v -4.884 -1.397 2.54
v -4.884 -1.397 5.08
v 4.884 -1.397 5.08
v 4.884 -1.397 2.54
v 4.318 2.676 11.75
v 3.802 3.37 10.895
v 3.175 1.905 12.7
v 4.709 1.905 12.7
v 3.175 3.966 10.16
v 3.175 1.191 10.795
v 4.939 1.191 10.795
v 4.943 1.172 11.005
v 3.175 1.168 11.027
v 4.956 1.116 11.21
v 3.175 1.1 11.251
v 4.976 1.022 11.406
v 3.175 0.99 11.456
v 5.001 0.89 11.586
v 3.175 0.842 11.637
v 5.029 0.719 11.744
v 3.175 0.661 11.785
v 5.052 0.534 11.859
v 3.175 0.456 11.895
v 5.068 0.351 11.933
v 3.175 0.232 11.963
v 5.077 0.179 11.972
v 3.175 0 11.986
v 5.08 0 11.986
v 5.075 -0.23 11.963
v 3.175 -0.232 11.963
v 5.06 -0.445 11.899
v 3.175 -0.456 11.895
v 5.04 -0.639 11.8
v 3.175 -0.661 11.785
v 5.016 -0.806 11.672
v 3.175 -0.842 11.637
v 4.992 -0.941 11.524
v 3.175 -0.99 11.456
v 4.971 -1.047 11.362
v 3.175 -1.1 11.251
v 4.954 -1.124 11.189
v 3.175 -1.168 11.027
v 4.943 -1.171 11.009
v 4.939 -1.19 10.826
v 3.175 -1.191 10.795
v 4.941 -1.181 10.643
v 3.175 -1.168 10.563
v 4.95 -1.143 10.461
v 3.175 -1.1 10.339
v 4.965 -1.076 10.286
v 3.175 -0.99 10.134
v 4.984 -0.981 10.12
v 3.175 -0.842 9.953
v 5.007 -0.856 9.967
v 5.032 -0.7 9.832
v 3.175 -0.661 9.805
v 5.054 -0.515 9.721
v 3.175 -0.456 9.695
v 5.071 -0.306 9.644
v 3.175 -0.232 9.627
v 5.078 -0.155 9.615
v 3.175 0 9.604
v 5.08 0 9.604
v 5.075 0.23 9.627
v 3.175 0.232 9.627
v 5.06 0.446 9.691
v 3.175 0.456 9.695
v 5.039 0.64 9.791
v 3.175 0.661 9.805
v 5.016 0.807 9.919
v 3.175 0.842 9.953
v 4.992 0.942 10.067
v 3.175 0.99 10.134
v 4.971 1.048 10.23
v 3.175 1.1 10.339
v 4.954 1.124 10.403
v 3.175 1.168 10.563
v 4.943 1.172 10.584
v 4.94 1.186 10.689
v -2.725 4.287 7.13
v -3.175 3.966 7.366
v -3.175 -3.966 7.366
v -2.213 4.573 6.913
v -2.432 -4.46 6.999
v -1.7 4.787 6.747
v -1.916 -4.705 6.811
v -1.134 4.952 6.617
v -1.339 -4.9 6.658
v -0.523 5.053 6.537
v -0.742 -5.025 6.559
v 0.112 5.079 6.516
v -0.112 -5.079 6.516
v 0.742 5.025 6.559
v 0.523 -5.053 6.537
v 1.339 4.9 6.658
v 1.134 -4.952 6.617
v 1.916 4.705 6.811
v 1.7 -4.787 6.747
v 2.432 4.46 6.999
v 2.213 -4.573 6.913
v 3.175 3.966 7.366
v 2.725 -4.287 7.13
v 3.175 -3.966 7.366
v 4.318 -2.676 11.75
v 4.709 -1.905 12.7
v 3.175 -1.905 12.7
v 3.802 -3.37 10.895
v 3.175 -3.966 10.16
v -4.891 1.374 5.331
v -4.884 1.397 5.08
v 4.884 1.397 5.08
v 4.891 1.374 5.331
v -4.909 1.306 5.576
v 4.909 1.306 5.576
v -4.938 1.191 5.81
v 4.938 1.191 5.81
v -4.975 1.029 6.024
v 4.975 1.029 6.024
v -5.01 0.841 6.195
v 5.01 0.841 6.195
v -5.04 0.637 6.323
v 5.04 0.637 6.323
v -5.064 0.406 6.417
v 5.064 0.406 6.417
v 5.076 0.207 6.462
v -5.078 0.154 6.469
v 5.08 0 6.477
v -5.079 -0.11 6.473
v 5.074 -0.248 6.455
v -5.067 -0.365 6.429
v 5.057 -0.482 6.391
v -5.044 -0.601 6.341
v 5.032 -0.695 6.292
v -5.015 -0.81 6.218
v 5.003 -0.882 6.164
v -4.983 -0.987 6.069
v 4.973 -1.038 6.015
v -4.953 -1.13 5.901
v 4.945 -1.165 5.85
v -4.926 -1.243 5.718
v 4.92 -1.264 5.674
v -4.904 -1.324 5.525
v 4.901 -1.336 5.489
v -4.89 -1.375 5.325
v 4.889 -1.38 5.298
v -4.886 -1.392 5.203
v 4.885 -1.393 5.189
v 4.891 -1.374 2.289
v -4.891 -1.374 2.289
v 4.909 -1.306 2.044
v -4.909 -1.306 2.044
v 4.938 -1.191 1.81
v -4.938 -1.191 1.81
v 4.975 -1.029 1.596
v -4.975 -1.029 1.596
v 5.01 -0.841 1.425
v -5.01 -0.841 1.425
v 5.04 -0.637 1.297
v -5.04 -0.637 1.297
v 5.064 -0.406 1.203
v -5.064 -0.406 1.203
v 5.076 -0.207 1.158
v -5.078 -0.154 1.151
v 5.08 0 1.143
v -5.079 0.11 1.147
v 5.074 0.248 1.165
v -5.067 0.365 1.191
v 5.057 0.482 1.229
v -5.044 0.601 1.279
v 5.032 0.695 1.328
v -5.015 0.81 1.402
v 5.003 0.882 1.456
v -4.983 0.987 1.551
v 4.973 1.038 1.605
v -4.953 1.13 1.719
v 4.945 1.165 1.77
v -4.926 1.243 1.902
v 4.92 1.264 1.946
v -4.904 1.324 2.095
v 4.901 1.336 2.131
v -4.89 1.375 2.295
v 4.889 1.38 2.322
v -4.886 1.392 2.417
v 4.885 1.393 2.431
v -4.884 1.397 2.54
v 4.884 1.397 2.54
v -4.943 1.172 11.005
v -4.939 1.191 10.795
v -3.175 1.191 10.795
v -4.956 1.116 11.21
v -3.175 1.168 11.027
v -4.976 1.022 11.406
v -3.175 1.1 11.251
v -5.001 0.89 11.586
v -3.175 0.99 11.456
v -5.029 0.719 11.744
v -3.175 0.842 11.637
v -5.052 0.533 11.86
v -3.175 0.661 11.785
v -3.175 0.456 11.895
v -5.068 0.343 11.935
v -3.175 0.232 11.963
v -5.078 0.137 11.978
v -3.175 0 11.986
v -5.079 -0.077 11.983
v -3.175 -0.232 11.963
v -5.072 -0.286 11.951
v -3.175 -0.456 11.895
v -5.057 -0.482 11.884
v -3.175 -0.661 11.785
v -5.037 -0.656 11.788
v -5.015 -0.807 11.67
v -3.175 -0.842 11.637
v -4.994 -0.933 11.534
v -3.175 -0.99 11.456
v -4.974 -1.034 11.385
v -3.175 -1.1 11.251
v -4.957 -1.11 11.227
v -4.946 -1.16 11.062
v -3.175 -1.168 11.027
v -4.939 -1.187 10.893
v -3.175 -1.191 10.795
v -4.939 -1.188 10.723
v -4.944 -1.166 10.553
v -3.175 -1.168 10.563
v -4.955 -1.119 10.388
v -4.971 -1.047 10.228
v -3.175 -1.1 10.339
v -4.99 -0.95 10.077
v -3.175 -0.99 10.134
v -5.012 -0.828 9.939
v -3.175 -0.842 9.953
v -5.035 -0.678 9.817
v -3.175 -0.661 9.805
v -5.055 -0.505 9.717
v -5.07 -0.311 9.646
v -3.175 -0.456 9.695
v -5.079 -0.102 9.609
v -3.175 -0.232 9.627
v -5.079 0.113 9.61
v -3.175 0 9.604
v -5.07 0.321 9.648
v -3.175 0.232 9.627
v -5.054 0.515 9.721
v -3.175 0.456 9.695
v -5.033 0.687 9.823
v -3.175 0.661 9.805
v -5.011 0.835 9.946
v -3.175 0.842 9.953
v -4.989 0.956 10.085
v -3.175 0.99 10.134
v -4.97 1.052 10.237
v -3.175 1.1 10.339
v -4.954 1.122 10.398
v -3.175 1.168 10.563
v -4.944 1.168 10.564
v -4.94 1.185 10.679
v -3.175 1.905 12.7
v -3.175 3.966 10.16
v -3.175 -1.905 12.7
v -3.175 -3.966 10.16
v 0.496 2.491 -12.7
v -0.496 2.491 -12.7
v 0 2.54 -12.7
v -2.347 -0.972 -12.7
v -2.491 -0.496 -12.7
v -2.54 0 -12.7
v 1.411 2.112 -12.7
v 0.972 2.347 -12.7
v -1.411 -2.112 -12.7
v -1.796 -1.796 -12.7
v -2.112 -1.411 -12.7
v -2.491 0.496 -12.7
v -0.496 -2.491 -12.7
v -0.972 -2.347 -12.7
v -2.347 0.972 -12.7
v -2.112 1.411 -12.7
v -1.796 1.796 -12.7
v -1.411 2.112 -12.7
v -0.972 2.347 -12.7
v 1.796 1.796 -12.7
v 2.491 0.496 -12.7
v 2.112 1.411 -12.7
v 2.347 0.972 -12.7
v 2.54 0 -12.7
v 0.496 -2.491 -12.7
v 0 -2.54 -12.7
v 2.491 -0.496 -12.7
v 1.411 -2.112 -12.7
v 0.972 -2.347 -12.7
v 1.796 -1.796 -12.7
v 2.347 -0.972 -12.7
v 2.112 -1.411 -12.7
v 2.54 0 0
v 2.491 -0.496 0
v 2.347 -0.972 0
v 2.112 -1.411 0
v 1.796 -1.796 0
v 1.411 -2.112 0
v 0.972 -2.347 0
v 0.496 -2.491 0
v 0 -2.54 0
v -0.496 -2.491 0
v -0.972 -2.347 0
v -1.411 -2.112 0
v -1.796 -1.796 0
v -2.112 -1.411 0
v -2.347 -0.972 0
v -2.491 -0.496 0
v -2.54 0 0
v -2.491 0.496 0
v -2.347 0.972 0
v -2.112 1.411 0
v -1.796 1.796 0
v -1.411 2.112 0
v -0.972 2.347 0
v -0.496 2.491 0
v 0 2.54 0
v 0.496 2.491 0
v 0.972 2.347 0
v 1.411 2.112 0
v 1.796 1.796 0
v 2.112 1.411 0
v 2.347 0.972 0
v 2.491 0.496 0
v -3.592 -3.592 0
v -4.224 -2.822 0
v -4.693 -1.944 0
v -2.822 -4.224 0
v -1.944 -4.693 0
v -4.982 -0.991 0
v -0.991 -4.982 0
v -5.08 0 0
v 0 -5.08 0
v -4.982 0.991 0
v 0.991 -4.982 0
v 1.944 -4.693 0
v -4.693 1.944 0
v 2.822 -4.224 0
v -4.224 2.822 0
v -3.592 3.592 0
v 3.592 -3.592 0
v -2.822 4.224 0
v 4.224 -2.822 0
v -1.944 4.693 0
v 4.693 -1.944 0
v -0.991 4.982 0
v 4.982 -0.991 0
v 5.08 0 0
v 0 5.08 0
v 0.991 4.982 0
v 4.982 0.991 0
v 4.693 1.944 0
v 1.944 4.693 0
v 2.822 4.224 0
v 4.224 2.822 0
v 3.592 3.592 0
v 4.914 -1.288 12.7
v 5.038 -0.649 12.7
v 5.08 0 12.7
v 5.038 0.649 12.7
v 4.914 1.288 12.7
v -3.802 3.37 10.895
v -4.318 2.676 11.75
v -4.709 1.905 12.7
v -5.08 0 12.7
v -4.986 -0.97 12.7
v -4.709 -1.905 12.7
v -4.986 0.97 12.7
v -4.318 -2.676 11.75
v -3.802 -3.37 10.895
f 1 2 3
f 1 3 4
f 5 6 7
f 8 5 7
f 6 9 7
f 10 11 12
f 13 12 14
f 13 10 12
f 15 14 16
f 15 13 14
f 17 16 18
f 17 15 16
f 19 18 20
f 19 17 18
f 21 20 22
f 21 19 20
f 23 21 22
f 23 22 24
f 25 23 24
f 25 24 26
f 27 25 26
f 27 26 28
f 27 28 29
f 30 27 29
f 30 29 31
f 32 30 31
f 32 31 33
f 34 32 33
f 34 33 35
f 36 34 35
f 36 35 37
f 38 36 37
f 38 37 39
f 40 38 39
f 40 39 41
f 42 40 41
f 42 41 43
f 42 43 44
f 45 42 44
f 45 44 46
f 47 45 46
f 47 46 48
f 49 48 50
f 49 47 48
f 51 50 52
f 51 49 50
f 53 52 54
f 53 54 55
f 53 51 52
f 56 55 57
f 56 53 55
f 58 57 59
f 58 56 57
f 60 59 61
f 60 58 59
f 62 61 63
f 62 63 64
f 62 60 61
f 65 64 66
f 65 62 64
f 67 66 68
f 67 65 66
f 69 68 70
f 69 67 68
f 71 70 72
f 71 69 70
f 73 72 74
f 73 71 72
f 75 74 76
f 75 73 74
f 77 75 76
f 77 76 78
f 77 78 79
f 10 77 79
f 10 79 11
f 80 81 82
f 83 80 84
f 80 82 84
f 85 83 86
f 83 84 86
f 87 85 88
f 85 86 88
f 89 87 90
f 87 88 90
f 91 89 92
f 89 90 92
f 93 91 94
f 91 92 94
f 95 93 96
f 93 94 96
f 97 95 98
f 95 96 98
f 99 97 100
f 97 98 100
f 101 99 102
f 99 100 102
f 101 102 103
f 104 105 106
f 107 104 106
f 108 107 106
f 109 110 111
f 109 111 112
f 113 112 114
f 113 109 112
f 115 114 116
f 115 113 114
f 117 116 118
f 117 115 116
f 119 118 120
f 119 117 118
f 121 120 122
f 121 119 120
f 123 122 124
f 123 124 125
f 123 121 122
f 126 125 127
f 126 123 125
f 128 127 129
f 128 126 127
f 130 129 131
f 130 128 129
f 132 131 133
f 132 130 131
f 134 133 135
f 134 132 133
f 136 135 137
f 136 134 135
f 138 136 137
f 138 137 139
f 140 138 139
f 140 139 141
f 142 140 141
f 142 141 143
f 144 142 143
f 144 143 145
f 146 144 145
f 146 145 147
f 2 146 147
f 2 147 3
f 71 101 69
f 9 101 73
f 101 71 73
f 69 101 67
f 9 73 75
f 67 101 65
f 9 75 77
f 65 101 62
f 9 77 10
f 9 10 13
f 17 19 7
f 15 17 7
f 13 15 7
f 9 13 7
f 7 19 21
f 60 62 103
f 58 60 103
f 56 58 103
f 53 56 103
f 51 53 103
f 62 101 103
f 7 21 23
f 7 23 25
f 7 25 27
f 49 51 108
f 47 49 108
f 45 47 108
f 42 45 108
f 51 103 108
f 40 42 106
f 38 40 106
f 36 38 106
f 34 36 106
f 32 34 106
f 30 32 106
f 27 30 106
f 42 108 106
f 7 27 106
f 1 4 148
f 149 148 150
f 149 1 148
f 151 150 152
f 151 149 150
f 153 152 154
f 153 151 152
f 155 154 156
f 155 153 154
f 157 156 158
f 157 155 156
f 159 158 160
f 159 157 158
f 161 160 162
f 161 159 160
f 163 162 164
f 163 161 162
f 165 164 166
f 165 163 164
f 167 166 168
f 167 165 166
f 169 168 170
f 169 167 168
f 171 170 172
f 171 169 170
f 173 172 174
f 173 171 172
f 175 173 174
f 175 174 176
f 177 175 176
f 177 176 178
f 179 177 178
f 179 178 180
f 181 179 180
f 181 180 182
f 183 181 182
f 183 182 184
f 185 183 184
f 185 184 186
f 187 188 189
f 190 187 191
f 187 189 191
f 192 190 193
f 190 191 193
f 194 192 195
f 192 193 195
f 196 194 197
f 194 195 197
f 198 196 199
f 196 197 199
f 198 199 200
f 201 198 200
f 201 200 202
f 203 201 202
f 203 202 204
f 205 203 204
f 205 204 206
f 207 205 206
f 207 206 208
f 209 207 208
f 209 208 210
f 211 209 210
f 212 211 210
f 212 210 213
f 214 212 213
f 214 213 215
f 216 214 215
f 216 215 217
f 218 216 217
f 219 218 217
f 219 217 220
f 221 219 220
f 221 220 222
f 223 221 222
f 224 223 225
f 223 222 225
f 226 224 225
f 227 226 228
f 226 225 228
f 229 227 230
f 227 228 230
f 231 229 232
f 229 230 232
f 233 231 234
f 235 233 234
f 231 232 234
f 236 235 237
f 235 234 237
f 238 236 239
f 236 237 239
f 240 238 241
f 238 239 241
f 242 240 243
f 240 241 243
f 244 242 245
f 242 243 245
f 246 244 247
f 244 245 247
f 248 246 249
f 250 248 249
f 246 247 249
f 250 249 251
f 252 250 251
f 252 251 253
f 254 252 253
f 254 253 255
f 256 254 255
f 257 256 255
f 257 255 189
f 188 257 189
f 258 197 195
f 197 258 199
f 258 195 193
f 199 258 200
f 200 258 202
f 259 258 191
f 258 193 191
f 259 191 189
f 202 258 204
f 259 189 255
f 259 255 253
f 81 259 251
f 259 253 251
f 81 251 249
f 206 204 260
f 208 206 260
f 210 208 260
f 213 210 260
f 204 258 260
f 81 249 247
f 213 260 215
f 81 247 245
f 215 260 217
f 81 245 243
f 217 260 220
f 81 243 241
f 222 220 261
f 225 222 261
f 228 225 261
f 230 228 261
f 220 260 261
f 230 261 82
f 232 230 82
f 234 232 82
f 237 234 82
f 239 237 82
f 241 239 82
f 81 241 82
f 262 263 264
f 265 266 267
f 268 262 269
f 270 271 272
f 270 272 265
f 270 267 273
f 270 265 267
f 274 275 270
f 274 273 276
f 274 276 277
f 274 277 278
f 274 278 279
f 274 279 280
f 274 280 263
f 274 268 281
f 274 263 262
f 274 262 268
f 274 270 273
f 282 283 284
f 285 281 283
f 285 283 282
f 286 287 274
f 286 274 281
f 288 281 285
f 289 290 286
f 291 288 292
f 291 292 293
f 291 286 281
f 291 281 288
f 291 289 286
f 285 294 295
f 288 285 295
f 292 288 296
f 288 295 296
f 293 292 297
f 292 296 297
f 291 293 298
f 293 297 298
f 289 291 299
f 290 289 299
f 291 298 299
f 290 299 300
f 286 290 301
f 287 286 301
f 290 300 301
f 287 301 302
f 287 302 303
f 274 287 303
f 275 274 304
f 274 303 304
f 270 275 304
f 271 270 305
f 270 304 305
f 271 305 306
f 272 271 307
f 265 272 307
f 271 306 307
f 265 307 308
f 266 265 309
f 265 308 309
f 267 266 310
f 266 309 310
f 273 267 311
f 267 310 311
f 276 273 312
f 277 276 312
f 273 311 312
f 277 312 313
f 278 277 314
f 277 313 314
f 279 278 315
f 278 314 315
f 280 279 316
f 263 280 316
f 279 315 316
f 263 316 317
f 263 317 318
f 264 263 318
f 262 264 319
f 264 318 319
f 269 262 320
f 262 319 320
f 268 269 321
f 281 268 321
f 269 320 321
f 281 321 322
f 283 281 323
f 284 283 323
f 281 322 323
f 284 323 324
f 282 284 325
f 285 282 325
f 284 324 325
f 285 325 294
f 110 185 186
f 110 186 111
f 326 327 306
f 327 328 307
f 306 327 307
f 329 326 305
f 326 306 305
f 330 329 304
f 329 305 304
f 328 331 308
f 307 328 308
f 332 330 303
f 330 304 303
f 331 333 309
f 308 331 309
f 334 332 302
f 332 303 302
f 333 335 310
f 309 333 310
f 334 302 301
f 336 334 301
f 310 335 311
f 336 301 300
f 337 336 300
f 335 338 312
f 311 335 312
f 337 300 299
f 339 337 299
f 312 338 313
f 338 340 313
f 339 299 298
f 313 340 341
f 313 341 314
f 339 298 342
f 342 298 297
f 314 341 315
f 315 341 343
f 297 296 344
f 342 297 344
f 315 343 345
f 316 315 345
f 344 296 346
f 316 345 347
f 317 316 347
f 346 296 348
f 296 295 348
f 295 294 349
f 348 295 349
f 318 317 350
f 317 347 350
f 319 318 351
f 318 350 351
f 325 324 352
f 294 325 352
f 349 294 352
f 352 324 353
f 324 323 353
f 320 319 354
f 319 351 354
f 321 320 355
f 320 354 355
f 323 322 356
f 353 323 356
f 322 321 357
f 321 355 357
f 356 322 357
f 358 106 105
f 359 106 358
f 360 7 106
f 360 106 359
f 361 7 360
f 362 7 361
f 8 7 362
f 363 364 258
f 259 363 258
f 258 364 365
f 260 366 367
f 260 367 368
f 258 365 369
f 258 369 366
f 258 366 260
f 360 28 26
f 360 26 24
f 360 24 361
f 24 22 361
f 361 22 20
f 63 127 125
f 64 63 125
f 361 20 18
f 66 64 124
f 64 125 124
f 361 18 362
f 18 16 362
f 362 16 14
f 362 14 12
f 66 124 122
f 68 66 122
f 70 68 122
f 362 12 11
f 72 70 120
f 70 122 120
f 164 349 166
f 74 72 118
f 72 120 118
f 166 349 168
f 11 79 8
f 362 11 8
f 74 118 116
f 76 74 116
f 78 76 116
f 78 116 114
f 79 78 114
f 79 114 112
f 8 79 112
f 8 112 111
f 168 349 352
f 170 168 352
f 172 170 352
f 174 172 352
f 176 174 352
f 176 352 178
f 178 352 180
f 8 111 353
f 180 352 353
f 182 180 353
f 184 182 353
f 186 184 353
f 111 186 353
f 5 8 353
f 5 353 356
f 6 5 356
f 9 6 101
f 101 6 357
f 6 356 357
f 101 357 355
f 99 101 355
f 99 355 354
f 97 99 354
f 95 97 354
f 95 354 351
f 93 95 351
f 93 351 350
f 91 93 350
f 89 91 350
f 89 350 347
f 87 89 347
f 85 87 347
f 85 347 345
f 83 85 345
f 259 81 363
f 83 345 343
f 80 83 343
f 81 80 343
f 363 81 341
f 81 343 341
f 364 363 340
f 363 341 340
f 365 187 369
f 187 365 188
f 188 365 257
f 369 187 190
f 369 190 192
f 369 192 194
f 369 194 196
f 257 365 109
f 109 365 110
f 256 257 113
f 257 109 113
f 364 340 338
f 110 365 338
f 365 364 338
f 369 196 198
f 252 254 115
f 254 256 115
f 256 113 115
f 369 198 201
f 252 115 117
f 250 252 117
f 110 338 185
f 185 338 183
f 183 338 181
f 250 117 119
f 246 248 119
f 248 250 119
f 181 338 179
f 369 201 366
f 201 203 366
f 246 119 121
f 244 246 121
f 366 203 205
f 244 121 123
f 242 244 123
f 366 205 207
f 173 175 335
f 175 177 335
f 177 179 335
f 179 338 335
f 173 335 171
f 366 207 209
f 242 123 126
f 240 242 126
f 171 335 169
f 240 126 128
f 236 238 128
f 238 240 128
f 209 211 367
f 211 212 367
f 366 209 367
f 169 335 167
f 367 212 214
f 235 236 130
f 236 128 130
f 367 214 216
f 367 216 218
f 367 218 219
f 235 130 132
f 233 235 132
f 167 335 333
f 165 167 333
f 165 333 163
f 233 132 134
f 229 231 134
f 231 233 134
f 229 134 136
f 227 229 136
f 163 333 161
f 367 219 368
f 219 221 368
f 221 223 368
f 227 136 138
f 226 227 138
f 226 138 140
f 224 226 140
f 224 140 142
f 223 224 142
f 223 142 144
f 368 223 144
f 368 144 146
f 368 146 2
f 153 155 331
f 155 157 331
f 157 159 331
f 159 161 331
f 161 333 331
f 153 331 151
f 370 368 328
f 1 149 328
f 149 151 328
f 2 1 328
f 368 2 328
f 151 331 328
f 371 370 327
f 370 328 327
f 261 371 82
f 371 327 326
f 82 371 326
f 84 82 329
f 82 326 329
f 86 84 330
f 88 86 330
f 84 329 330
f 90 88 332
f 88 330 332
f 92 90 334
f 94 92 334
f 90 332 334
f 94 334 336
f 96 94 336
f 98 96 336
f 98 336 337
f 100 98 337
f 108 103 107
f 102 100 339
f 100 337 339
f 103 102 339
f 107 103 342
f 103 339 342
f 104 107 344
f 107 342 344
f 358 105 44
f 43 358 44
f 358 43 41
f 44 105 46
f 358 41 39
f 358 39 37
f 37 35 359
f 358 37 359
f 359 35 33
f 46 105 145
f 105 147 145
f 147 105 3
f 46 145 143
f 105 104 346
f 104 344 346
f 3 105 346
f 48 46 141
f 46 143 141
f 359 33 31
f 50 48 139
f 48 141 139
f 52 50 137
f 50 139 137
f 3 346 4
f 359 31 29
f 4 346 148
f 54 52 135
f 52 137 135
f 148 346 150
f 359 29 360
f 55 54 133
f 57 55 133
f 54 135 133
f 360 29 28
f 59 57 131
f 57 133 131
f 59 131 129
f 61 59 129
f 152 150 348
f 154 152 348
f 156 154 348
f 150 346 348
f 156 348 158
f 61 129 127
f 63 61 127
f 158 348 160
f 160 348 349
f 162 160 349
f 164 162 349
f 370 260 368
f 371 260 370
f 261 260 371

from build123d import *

# Parameters (mm, degrees)
F0_R          = 5.08
F1_DEPTH      = 12.7
F2_R          = 2.54
F3_DEPTH      = 12.7
F4_W          = 6.35
F4_H          = 5.08
F5_DEPTH      = 12.7
F7_DEPTH      = 5.081
F7_DEPTH_BACK = 5.081
F8_R          = 1.190625
F9_DEPTH      = 5.0810001
F9_DEPTH_BACK = 5.0810001
F11_DEPTH     = 12.7
F13_DEPTH     = 12.7


with BuildPart() as f1:
    # F0 (on Top) → F1 (new body)
    with BuildSketch(Plane.XY):
        Circle(F0_R)
    extrude(amount=F1_DEPTH)

    # F2 (on face) → F3 (join)
    with BuildSketch(Plane(origin=(0, 0, 0), x_dir=(1, 0, 0), z_dir=(0, 0, -1))):
        Circle(F2_R)
    extrude(amount=F3_DEPTH)

    # F4 (on Front) → F5 (cut, symmetric)
    with BuildSketch(Plane.XZ):
        with Locations((0, 10.16)):
            Rectangle(F4_W, F4_H)
    extrude(amount=F5_DEPTH, both=True, mode=Mode.SUBTRACT)

    # F6 (on Right) → F7 (cut, two sides)
    with BuildSketch(Plane.YZ) as f7_sk:
        with BuildLine():
            ThreePointArc((1.397, 5.08), (0, 6.477), (-1.397, 5.08))
            Line((-1.397, 5.08), (-1.397, 2.54))
            ThreePointArc((-1.397, 2.54), (0, 1.143), (1.397, 2.54))
            Line((1.397, 2.54), (1.397, 5.08))
        make_face()
    extrude(amount=F7_DEPTH, mode=Mode.SUBTRACT)
    extrude(f7_sk.sketch, amount=-F7_DEPTH_BACK, mode=Mode.SUBTRACT)

    # F8 (on Right) → F9 (cut, two sides)
    with BuildSketch(Plane.YZ) as f9_sk:
        with Locations((0, 10.795)):
            Circle(F8_R)
    extrude(amount=-F9_DEPTH, mode=Mode.SUBTRACT)
    extrude(f9_sk.sketch, amount=F9_DEPTH_BACK, mode=Mode.SUBTRACT)

    # F10 (on face) → F11 (cut, symmetric)
    with BuildSketch(Plane(origin=(3.175, 0, 0), x_dir=(0, -1, 0), z_dir=(-1, 0, 0))):
        Polygon((3.965573729, 10.16), (3.965573729, 12.7), (1.905, 12.7), align=None)
        Polygon((-3.965573729, 10.16), (-1.905, 12.7), (-3.965573729, 12.7), align=None)
    extrude(amount=F11_DEPTH, both=True, mode=Mode.SUBTRACT)

    # F12 (on Front) → F13 (cut, symmetric)
    with BuildSketch(Plane.XZ):
        with BuildLine():
            Line((3.175, 7.366), (3.175, 7.62))
            Line((3.175, 7.62), (-3.175, 7.62))
            Line((-3.175, 7.62), (-3.175, 7.366))
            ThreePointArc((-3.175, 7.366), (0, 6.515261314), (3.175, 7.366))
        make_face()
    extrude(amount=F13_DEPTH, both=True, mode=Mode.SUBTRACT)


solid = f1.part
